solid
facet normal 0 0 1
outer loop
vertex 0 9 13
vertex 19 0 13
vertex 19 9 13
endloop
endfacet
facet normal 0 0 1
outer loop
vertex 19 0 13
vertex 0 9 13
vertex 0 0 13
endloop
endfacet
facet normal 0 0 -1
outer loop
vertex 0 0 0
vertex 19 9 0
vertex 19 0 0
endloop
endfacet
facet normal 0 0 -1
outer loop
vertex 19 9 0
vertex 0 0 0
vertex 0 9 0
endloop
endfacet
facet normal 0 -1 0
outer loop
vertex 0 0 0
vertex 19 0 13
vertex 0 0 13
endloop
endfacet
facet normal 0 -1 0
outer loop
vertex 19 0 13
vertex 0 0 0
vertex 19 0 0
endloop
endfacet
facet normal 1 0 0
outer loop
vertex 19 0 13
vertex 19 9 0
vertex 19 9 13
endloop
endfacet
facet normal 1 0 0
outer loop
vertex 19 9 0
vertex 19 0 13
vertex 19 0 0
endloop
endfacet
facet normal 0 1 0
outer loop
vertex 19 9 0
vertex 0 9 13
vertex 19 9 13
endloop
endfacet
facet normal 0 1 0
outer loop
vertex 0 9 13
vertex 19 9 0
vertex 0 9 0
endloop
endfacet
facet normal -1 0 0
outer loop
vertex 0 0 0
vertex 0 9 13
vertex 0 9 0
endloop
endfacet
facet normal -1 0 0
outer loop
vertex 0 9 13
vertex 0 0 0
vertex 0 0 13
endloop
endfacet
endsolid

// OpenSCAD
// Generated by SolidPython 1.0.1 on 2020-07-29 00:46:56


cube(size = [19, 9, 13]);
/***********************************************
*********      SolidPython code:      **********
************************************************
 
# import packages: SolidPython
from solid import *
from solid.utils import *
from itertools import chain, combinations, permutations


class Resize:

    def __init__(self, scad_file):
        self.scad_file = scad_file
        #self.scad_file = import_scad(scad_file)
        # cone/cylinder param:
        self.r1 = 0
        self.r2 = 0
        self.h = 0
        # rectangular prism param:
        self.w = 0
        self.l = 0
        # ellipse param:
        self.r = 0

    # import OpenScad code (file name corresponds to shape)


    # classify shape + parameters
    def assign(self, param1, param2, param3):
        if self.scad_file == 'cone.scad':
            self.r1 = param1
            self.r2 = param2
            self.h = param3
        elif self.scad_file == 'cylinder.scad':
            self.r1 = param1
            self.r2 = param2
            self.h = param3
        elif self.scad_file == 'rectangularPrism.scad':
            self.h = param1
            self.l = param2
            self.w = param3
        else:
            self.r = param1
            self.h = param2

    # resize parameters
    def iterate(self):
        x = range(3, 20, 2)
        i = 1
        if self.scad_file == 'cone.scad':
            tempList = list(permutations(x, 2))
            for temp in tempList:
                param1 = temp[0]
                param2 = temp[1]
                filepath = 'produced_scad_files/' + 'cone' + str(param1) + '_' + str(param2) + '_' + '.scad'
                scad_render_to_file(cylinder(h=param1, r1=param2, r2=0), filepath)

        elif self.scad_file == 'cylinder.scad':
            tempList = list(permutations(x, 3))
            for temp in tempList:
                param1 = temp[0]
                param2 = temp[1]
                filepath = 'produced_scad_files/' + 'cylinder' + str(param1) + '_' + str(param2) + '_' + '.scad'
                scad_render_to_file(cylinder(h=param1, r1=param2, r2=param2), filepath)

        elif self.scad_file == 'rectangularPrism.scad':
            tempList = list(permutations(x, 3))
            for temp in tempList:
                param1 = temp[0]
                param2 = temp[1]
                param3 = temp[2]
                filepath = 'produced_scad_files/' + 'rectangularPrism' + str(param1) + '_' + str(param2) + '_' + str(
                    param3) + '.scad'
                scad_render_to_file(cube(size=(param1, param2, param3)), filepath)

        elif self.scad_file == 'ellipse.scad':
            tempList = list(permutations(x, 4))
            for temp in tempList:
                param1 = temp[0]
                param2 = temp[1]
                param3 = temp[2]
                param4 = temp[3]
                filepath = 'produced_scad_files/' + 'ellipse' + str(param1) + '_' + str(param2) + '_' + str(param3) + '_' + str(param4) + '.scad'
                scad_render_to_file(scale([param1, param2, param3])(sphere(r=param4)), filepath)

    def render_to_scadfile(self):
        scad_render_to_file(scad, 'example.scad') 
 
************************************************/
